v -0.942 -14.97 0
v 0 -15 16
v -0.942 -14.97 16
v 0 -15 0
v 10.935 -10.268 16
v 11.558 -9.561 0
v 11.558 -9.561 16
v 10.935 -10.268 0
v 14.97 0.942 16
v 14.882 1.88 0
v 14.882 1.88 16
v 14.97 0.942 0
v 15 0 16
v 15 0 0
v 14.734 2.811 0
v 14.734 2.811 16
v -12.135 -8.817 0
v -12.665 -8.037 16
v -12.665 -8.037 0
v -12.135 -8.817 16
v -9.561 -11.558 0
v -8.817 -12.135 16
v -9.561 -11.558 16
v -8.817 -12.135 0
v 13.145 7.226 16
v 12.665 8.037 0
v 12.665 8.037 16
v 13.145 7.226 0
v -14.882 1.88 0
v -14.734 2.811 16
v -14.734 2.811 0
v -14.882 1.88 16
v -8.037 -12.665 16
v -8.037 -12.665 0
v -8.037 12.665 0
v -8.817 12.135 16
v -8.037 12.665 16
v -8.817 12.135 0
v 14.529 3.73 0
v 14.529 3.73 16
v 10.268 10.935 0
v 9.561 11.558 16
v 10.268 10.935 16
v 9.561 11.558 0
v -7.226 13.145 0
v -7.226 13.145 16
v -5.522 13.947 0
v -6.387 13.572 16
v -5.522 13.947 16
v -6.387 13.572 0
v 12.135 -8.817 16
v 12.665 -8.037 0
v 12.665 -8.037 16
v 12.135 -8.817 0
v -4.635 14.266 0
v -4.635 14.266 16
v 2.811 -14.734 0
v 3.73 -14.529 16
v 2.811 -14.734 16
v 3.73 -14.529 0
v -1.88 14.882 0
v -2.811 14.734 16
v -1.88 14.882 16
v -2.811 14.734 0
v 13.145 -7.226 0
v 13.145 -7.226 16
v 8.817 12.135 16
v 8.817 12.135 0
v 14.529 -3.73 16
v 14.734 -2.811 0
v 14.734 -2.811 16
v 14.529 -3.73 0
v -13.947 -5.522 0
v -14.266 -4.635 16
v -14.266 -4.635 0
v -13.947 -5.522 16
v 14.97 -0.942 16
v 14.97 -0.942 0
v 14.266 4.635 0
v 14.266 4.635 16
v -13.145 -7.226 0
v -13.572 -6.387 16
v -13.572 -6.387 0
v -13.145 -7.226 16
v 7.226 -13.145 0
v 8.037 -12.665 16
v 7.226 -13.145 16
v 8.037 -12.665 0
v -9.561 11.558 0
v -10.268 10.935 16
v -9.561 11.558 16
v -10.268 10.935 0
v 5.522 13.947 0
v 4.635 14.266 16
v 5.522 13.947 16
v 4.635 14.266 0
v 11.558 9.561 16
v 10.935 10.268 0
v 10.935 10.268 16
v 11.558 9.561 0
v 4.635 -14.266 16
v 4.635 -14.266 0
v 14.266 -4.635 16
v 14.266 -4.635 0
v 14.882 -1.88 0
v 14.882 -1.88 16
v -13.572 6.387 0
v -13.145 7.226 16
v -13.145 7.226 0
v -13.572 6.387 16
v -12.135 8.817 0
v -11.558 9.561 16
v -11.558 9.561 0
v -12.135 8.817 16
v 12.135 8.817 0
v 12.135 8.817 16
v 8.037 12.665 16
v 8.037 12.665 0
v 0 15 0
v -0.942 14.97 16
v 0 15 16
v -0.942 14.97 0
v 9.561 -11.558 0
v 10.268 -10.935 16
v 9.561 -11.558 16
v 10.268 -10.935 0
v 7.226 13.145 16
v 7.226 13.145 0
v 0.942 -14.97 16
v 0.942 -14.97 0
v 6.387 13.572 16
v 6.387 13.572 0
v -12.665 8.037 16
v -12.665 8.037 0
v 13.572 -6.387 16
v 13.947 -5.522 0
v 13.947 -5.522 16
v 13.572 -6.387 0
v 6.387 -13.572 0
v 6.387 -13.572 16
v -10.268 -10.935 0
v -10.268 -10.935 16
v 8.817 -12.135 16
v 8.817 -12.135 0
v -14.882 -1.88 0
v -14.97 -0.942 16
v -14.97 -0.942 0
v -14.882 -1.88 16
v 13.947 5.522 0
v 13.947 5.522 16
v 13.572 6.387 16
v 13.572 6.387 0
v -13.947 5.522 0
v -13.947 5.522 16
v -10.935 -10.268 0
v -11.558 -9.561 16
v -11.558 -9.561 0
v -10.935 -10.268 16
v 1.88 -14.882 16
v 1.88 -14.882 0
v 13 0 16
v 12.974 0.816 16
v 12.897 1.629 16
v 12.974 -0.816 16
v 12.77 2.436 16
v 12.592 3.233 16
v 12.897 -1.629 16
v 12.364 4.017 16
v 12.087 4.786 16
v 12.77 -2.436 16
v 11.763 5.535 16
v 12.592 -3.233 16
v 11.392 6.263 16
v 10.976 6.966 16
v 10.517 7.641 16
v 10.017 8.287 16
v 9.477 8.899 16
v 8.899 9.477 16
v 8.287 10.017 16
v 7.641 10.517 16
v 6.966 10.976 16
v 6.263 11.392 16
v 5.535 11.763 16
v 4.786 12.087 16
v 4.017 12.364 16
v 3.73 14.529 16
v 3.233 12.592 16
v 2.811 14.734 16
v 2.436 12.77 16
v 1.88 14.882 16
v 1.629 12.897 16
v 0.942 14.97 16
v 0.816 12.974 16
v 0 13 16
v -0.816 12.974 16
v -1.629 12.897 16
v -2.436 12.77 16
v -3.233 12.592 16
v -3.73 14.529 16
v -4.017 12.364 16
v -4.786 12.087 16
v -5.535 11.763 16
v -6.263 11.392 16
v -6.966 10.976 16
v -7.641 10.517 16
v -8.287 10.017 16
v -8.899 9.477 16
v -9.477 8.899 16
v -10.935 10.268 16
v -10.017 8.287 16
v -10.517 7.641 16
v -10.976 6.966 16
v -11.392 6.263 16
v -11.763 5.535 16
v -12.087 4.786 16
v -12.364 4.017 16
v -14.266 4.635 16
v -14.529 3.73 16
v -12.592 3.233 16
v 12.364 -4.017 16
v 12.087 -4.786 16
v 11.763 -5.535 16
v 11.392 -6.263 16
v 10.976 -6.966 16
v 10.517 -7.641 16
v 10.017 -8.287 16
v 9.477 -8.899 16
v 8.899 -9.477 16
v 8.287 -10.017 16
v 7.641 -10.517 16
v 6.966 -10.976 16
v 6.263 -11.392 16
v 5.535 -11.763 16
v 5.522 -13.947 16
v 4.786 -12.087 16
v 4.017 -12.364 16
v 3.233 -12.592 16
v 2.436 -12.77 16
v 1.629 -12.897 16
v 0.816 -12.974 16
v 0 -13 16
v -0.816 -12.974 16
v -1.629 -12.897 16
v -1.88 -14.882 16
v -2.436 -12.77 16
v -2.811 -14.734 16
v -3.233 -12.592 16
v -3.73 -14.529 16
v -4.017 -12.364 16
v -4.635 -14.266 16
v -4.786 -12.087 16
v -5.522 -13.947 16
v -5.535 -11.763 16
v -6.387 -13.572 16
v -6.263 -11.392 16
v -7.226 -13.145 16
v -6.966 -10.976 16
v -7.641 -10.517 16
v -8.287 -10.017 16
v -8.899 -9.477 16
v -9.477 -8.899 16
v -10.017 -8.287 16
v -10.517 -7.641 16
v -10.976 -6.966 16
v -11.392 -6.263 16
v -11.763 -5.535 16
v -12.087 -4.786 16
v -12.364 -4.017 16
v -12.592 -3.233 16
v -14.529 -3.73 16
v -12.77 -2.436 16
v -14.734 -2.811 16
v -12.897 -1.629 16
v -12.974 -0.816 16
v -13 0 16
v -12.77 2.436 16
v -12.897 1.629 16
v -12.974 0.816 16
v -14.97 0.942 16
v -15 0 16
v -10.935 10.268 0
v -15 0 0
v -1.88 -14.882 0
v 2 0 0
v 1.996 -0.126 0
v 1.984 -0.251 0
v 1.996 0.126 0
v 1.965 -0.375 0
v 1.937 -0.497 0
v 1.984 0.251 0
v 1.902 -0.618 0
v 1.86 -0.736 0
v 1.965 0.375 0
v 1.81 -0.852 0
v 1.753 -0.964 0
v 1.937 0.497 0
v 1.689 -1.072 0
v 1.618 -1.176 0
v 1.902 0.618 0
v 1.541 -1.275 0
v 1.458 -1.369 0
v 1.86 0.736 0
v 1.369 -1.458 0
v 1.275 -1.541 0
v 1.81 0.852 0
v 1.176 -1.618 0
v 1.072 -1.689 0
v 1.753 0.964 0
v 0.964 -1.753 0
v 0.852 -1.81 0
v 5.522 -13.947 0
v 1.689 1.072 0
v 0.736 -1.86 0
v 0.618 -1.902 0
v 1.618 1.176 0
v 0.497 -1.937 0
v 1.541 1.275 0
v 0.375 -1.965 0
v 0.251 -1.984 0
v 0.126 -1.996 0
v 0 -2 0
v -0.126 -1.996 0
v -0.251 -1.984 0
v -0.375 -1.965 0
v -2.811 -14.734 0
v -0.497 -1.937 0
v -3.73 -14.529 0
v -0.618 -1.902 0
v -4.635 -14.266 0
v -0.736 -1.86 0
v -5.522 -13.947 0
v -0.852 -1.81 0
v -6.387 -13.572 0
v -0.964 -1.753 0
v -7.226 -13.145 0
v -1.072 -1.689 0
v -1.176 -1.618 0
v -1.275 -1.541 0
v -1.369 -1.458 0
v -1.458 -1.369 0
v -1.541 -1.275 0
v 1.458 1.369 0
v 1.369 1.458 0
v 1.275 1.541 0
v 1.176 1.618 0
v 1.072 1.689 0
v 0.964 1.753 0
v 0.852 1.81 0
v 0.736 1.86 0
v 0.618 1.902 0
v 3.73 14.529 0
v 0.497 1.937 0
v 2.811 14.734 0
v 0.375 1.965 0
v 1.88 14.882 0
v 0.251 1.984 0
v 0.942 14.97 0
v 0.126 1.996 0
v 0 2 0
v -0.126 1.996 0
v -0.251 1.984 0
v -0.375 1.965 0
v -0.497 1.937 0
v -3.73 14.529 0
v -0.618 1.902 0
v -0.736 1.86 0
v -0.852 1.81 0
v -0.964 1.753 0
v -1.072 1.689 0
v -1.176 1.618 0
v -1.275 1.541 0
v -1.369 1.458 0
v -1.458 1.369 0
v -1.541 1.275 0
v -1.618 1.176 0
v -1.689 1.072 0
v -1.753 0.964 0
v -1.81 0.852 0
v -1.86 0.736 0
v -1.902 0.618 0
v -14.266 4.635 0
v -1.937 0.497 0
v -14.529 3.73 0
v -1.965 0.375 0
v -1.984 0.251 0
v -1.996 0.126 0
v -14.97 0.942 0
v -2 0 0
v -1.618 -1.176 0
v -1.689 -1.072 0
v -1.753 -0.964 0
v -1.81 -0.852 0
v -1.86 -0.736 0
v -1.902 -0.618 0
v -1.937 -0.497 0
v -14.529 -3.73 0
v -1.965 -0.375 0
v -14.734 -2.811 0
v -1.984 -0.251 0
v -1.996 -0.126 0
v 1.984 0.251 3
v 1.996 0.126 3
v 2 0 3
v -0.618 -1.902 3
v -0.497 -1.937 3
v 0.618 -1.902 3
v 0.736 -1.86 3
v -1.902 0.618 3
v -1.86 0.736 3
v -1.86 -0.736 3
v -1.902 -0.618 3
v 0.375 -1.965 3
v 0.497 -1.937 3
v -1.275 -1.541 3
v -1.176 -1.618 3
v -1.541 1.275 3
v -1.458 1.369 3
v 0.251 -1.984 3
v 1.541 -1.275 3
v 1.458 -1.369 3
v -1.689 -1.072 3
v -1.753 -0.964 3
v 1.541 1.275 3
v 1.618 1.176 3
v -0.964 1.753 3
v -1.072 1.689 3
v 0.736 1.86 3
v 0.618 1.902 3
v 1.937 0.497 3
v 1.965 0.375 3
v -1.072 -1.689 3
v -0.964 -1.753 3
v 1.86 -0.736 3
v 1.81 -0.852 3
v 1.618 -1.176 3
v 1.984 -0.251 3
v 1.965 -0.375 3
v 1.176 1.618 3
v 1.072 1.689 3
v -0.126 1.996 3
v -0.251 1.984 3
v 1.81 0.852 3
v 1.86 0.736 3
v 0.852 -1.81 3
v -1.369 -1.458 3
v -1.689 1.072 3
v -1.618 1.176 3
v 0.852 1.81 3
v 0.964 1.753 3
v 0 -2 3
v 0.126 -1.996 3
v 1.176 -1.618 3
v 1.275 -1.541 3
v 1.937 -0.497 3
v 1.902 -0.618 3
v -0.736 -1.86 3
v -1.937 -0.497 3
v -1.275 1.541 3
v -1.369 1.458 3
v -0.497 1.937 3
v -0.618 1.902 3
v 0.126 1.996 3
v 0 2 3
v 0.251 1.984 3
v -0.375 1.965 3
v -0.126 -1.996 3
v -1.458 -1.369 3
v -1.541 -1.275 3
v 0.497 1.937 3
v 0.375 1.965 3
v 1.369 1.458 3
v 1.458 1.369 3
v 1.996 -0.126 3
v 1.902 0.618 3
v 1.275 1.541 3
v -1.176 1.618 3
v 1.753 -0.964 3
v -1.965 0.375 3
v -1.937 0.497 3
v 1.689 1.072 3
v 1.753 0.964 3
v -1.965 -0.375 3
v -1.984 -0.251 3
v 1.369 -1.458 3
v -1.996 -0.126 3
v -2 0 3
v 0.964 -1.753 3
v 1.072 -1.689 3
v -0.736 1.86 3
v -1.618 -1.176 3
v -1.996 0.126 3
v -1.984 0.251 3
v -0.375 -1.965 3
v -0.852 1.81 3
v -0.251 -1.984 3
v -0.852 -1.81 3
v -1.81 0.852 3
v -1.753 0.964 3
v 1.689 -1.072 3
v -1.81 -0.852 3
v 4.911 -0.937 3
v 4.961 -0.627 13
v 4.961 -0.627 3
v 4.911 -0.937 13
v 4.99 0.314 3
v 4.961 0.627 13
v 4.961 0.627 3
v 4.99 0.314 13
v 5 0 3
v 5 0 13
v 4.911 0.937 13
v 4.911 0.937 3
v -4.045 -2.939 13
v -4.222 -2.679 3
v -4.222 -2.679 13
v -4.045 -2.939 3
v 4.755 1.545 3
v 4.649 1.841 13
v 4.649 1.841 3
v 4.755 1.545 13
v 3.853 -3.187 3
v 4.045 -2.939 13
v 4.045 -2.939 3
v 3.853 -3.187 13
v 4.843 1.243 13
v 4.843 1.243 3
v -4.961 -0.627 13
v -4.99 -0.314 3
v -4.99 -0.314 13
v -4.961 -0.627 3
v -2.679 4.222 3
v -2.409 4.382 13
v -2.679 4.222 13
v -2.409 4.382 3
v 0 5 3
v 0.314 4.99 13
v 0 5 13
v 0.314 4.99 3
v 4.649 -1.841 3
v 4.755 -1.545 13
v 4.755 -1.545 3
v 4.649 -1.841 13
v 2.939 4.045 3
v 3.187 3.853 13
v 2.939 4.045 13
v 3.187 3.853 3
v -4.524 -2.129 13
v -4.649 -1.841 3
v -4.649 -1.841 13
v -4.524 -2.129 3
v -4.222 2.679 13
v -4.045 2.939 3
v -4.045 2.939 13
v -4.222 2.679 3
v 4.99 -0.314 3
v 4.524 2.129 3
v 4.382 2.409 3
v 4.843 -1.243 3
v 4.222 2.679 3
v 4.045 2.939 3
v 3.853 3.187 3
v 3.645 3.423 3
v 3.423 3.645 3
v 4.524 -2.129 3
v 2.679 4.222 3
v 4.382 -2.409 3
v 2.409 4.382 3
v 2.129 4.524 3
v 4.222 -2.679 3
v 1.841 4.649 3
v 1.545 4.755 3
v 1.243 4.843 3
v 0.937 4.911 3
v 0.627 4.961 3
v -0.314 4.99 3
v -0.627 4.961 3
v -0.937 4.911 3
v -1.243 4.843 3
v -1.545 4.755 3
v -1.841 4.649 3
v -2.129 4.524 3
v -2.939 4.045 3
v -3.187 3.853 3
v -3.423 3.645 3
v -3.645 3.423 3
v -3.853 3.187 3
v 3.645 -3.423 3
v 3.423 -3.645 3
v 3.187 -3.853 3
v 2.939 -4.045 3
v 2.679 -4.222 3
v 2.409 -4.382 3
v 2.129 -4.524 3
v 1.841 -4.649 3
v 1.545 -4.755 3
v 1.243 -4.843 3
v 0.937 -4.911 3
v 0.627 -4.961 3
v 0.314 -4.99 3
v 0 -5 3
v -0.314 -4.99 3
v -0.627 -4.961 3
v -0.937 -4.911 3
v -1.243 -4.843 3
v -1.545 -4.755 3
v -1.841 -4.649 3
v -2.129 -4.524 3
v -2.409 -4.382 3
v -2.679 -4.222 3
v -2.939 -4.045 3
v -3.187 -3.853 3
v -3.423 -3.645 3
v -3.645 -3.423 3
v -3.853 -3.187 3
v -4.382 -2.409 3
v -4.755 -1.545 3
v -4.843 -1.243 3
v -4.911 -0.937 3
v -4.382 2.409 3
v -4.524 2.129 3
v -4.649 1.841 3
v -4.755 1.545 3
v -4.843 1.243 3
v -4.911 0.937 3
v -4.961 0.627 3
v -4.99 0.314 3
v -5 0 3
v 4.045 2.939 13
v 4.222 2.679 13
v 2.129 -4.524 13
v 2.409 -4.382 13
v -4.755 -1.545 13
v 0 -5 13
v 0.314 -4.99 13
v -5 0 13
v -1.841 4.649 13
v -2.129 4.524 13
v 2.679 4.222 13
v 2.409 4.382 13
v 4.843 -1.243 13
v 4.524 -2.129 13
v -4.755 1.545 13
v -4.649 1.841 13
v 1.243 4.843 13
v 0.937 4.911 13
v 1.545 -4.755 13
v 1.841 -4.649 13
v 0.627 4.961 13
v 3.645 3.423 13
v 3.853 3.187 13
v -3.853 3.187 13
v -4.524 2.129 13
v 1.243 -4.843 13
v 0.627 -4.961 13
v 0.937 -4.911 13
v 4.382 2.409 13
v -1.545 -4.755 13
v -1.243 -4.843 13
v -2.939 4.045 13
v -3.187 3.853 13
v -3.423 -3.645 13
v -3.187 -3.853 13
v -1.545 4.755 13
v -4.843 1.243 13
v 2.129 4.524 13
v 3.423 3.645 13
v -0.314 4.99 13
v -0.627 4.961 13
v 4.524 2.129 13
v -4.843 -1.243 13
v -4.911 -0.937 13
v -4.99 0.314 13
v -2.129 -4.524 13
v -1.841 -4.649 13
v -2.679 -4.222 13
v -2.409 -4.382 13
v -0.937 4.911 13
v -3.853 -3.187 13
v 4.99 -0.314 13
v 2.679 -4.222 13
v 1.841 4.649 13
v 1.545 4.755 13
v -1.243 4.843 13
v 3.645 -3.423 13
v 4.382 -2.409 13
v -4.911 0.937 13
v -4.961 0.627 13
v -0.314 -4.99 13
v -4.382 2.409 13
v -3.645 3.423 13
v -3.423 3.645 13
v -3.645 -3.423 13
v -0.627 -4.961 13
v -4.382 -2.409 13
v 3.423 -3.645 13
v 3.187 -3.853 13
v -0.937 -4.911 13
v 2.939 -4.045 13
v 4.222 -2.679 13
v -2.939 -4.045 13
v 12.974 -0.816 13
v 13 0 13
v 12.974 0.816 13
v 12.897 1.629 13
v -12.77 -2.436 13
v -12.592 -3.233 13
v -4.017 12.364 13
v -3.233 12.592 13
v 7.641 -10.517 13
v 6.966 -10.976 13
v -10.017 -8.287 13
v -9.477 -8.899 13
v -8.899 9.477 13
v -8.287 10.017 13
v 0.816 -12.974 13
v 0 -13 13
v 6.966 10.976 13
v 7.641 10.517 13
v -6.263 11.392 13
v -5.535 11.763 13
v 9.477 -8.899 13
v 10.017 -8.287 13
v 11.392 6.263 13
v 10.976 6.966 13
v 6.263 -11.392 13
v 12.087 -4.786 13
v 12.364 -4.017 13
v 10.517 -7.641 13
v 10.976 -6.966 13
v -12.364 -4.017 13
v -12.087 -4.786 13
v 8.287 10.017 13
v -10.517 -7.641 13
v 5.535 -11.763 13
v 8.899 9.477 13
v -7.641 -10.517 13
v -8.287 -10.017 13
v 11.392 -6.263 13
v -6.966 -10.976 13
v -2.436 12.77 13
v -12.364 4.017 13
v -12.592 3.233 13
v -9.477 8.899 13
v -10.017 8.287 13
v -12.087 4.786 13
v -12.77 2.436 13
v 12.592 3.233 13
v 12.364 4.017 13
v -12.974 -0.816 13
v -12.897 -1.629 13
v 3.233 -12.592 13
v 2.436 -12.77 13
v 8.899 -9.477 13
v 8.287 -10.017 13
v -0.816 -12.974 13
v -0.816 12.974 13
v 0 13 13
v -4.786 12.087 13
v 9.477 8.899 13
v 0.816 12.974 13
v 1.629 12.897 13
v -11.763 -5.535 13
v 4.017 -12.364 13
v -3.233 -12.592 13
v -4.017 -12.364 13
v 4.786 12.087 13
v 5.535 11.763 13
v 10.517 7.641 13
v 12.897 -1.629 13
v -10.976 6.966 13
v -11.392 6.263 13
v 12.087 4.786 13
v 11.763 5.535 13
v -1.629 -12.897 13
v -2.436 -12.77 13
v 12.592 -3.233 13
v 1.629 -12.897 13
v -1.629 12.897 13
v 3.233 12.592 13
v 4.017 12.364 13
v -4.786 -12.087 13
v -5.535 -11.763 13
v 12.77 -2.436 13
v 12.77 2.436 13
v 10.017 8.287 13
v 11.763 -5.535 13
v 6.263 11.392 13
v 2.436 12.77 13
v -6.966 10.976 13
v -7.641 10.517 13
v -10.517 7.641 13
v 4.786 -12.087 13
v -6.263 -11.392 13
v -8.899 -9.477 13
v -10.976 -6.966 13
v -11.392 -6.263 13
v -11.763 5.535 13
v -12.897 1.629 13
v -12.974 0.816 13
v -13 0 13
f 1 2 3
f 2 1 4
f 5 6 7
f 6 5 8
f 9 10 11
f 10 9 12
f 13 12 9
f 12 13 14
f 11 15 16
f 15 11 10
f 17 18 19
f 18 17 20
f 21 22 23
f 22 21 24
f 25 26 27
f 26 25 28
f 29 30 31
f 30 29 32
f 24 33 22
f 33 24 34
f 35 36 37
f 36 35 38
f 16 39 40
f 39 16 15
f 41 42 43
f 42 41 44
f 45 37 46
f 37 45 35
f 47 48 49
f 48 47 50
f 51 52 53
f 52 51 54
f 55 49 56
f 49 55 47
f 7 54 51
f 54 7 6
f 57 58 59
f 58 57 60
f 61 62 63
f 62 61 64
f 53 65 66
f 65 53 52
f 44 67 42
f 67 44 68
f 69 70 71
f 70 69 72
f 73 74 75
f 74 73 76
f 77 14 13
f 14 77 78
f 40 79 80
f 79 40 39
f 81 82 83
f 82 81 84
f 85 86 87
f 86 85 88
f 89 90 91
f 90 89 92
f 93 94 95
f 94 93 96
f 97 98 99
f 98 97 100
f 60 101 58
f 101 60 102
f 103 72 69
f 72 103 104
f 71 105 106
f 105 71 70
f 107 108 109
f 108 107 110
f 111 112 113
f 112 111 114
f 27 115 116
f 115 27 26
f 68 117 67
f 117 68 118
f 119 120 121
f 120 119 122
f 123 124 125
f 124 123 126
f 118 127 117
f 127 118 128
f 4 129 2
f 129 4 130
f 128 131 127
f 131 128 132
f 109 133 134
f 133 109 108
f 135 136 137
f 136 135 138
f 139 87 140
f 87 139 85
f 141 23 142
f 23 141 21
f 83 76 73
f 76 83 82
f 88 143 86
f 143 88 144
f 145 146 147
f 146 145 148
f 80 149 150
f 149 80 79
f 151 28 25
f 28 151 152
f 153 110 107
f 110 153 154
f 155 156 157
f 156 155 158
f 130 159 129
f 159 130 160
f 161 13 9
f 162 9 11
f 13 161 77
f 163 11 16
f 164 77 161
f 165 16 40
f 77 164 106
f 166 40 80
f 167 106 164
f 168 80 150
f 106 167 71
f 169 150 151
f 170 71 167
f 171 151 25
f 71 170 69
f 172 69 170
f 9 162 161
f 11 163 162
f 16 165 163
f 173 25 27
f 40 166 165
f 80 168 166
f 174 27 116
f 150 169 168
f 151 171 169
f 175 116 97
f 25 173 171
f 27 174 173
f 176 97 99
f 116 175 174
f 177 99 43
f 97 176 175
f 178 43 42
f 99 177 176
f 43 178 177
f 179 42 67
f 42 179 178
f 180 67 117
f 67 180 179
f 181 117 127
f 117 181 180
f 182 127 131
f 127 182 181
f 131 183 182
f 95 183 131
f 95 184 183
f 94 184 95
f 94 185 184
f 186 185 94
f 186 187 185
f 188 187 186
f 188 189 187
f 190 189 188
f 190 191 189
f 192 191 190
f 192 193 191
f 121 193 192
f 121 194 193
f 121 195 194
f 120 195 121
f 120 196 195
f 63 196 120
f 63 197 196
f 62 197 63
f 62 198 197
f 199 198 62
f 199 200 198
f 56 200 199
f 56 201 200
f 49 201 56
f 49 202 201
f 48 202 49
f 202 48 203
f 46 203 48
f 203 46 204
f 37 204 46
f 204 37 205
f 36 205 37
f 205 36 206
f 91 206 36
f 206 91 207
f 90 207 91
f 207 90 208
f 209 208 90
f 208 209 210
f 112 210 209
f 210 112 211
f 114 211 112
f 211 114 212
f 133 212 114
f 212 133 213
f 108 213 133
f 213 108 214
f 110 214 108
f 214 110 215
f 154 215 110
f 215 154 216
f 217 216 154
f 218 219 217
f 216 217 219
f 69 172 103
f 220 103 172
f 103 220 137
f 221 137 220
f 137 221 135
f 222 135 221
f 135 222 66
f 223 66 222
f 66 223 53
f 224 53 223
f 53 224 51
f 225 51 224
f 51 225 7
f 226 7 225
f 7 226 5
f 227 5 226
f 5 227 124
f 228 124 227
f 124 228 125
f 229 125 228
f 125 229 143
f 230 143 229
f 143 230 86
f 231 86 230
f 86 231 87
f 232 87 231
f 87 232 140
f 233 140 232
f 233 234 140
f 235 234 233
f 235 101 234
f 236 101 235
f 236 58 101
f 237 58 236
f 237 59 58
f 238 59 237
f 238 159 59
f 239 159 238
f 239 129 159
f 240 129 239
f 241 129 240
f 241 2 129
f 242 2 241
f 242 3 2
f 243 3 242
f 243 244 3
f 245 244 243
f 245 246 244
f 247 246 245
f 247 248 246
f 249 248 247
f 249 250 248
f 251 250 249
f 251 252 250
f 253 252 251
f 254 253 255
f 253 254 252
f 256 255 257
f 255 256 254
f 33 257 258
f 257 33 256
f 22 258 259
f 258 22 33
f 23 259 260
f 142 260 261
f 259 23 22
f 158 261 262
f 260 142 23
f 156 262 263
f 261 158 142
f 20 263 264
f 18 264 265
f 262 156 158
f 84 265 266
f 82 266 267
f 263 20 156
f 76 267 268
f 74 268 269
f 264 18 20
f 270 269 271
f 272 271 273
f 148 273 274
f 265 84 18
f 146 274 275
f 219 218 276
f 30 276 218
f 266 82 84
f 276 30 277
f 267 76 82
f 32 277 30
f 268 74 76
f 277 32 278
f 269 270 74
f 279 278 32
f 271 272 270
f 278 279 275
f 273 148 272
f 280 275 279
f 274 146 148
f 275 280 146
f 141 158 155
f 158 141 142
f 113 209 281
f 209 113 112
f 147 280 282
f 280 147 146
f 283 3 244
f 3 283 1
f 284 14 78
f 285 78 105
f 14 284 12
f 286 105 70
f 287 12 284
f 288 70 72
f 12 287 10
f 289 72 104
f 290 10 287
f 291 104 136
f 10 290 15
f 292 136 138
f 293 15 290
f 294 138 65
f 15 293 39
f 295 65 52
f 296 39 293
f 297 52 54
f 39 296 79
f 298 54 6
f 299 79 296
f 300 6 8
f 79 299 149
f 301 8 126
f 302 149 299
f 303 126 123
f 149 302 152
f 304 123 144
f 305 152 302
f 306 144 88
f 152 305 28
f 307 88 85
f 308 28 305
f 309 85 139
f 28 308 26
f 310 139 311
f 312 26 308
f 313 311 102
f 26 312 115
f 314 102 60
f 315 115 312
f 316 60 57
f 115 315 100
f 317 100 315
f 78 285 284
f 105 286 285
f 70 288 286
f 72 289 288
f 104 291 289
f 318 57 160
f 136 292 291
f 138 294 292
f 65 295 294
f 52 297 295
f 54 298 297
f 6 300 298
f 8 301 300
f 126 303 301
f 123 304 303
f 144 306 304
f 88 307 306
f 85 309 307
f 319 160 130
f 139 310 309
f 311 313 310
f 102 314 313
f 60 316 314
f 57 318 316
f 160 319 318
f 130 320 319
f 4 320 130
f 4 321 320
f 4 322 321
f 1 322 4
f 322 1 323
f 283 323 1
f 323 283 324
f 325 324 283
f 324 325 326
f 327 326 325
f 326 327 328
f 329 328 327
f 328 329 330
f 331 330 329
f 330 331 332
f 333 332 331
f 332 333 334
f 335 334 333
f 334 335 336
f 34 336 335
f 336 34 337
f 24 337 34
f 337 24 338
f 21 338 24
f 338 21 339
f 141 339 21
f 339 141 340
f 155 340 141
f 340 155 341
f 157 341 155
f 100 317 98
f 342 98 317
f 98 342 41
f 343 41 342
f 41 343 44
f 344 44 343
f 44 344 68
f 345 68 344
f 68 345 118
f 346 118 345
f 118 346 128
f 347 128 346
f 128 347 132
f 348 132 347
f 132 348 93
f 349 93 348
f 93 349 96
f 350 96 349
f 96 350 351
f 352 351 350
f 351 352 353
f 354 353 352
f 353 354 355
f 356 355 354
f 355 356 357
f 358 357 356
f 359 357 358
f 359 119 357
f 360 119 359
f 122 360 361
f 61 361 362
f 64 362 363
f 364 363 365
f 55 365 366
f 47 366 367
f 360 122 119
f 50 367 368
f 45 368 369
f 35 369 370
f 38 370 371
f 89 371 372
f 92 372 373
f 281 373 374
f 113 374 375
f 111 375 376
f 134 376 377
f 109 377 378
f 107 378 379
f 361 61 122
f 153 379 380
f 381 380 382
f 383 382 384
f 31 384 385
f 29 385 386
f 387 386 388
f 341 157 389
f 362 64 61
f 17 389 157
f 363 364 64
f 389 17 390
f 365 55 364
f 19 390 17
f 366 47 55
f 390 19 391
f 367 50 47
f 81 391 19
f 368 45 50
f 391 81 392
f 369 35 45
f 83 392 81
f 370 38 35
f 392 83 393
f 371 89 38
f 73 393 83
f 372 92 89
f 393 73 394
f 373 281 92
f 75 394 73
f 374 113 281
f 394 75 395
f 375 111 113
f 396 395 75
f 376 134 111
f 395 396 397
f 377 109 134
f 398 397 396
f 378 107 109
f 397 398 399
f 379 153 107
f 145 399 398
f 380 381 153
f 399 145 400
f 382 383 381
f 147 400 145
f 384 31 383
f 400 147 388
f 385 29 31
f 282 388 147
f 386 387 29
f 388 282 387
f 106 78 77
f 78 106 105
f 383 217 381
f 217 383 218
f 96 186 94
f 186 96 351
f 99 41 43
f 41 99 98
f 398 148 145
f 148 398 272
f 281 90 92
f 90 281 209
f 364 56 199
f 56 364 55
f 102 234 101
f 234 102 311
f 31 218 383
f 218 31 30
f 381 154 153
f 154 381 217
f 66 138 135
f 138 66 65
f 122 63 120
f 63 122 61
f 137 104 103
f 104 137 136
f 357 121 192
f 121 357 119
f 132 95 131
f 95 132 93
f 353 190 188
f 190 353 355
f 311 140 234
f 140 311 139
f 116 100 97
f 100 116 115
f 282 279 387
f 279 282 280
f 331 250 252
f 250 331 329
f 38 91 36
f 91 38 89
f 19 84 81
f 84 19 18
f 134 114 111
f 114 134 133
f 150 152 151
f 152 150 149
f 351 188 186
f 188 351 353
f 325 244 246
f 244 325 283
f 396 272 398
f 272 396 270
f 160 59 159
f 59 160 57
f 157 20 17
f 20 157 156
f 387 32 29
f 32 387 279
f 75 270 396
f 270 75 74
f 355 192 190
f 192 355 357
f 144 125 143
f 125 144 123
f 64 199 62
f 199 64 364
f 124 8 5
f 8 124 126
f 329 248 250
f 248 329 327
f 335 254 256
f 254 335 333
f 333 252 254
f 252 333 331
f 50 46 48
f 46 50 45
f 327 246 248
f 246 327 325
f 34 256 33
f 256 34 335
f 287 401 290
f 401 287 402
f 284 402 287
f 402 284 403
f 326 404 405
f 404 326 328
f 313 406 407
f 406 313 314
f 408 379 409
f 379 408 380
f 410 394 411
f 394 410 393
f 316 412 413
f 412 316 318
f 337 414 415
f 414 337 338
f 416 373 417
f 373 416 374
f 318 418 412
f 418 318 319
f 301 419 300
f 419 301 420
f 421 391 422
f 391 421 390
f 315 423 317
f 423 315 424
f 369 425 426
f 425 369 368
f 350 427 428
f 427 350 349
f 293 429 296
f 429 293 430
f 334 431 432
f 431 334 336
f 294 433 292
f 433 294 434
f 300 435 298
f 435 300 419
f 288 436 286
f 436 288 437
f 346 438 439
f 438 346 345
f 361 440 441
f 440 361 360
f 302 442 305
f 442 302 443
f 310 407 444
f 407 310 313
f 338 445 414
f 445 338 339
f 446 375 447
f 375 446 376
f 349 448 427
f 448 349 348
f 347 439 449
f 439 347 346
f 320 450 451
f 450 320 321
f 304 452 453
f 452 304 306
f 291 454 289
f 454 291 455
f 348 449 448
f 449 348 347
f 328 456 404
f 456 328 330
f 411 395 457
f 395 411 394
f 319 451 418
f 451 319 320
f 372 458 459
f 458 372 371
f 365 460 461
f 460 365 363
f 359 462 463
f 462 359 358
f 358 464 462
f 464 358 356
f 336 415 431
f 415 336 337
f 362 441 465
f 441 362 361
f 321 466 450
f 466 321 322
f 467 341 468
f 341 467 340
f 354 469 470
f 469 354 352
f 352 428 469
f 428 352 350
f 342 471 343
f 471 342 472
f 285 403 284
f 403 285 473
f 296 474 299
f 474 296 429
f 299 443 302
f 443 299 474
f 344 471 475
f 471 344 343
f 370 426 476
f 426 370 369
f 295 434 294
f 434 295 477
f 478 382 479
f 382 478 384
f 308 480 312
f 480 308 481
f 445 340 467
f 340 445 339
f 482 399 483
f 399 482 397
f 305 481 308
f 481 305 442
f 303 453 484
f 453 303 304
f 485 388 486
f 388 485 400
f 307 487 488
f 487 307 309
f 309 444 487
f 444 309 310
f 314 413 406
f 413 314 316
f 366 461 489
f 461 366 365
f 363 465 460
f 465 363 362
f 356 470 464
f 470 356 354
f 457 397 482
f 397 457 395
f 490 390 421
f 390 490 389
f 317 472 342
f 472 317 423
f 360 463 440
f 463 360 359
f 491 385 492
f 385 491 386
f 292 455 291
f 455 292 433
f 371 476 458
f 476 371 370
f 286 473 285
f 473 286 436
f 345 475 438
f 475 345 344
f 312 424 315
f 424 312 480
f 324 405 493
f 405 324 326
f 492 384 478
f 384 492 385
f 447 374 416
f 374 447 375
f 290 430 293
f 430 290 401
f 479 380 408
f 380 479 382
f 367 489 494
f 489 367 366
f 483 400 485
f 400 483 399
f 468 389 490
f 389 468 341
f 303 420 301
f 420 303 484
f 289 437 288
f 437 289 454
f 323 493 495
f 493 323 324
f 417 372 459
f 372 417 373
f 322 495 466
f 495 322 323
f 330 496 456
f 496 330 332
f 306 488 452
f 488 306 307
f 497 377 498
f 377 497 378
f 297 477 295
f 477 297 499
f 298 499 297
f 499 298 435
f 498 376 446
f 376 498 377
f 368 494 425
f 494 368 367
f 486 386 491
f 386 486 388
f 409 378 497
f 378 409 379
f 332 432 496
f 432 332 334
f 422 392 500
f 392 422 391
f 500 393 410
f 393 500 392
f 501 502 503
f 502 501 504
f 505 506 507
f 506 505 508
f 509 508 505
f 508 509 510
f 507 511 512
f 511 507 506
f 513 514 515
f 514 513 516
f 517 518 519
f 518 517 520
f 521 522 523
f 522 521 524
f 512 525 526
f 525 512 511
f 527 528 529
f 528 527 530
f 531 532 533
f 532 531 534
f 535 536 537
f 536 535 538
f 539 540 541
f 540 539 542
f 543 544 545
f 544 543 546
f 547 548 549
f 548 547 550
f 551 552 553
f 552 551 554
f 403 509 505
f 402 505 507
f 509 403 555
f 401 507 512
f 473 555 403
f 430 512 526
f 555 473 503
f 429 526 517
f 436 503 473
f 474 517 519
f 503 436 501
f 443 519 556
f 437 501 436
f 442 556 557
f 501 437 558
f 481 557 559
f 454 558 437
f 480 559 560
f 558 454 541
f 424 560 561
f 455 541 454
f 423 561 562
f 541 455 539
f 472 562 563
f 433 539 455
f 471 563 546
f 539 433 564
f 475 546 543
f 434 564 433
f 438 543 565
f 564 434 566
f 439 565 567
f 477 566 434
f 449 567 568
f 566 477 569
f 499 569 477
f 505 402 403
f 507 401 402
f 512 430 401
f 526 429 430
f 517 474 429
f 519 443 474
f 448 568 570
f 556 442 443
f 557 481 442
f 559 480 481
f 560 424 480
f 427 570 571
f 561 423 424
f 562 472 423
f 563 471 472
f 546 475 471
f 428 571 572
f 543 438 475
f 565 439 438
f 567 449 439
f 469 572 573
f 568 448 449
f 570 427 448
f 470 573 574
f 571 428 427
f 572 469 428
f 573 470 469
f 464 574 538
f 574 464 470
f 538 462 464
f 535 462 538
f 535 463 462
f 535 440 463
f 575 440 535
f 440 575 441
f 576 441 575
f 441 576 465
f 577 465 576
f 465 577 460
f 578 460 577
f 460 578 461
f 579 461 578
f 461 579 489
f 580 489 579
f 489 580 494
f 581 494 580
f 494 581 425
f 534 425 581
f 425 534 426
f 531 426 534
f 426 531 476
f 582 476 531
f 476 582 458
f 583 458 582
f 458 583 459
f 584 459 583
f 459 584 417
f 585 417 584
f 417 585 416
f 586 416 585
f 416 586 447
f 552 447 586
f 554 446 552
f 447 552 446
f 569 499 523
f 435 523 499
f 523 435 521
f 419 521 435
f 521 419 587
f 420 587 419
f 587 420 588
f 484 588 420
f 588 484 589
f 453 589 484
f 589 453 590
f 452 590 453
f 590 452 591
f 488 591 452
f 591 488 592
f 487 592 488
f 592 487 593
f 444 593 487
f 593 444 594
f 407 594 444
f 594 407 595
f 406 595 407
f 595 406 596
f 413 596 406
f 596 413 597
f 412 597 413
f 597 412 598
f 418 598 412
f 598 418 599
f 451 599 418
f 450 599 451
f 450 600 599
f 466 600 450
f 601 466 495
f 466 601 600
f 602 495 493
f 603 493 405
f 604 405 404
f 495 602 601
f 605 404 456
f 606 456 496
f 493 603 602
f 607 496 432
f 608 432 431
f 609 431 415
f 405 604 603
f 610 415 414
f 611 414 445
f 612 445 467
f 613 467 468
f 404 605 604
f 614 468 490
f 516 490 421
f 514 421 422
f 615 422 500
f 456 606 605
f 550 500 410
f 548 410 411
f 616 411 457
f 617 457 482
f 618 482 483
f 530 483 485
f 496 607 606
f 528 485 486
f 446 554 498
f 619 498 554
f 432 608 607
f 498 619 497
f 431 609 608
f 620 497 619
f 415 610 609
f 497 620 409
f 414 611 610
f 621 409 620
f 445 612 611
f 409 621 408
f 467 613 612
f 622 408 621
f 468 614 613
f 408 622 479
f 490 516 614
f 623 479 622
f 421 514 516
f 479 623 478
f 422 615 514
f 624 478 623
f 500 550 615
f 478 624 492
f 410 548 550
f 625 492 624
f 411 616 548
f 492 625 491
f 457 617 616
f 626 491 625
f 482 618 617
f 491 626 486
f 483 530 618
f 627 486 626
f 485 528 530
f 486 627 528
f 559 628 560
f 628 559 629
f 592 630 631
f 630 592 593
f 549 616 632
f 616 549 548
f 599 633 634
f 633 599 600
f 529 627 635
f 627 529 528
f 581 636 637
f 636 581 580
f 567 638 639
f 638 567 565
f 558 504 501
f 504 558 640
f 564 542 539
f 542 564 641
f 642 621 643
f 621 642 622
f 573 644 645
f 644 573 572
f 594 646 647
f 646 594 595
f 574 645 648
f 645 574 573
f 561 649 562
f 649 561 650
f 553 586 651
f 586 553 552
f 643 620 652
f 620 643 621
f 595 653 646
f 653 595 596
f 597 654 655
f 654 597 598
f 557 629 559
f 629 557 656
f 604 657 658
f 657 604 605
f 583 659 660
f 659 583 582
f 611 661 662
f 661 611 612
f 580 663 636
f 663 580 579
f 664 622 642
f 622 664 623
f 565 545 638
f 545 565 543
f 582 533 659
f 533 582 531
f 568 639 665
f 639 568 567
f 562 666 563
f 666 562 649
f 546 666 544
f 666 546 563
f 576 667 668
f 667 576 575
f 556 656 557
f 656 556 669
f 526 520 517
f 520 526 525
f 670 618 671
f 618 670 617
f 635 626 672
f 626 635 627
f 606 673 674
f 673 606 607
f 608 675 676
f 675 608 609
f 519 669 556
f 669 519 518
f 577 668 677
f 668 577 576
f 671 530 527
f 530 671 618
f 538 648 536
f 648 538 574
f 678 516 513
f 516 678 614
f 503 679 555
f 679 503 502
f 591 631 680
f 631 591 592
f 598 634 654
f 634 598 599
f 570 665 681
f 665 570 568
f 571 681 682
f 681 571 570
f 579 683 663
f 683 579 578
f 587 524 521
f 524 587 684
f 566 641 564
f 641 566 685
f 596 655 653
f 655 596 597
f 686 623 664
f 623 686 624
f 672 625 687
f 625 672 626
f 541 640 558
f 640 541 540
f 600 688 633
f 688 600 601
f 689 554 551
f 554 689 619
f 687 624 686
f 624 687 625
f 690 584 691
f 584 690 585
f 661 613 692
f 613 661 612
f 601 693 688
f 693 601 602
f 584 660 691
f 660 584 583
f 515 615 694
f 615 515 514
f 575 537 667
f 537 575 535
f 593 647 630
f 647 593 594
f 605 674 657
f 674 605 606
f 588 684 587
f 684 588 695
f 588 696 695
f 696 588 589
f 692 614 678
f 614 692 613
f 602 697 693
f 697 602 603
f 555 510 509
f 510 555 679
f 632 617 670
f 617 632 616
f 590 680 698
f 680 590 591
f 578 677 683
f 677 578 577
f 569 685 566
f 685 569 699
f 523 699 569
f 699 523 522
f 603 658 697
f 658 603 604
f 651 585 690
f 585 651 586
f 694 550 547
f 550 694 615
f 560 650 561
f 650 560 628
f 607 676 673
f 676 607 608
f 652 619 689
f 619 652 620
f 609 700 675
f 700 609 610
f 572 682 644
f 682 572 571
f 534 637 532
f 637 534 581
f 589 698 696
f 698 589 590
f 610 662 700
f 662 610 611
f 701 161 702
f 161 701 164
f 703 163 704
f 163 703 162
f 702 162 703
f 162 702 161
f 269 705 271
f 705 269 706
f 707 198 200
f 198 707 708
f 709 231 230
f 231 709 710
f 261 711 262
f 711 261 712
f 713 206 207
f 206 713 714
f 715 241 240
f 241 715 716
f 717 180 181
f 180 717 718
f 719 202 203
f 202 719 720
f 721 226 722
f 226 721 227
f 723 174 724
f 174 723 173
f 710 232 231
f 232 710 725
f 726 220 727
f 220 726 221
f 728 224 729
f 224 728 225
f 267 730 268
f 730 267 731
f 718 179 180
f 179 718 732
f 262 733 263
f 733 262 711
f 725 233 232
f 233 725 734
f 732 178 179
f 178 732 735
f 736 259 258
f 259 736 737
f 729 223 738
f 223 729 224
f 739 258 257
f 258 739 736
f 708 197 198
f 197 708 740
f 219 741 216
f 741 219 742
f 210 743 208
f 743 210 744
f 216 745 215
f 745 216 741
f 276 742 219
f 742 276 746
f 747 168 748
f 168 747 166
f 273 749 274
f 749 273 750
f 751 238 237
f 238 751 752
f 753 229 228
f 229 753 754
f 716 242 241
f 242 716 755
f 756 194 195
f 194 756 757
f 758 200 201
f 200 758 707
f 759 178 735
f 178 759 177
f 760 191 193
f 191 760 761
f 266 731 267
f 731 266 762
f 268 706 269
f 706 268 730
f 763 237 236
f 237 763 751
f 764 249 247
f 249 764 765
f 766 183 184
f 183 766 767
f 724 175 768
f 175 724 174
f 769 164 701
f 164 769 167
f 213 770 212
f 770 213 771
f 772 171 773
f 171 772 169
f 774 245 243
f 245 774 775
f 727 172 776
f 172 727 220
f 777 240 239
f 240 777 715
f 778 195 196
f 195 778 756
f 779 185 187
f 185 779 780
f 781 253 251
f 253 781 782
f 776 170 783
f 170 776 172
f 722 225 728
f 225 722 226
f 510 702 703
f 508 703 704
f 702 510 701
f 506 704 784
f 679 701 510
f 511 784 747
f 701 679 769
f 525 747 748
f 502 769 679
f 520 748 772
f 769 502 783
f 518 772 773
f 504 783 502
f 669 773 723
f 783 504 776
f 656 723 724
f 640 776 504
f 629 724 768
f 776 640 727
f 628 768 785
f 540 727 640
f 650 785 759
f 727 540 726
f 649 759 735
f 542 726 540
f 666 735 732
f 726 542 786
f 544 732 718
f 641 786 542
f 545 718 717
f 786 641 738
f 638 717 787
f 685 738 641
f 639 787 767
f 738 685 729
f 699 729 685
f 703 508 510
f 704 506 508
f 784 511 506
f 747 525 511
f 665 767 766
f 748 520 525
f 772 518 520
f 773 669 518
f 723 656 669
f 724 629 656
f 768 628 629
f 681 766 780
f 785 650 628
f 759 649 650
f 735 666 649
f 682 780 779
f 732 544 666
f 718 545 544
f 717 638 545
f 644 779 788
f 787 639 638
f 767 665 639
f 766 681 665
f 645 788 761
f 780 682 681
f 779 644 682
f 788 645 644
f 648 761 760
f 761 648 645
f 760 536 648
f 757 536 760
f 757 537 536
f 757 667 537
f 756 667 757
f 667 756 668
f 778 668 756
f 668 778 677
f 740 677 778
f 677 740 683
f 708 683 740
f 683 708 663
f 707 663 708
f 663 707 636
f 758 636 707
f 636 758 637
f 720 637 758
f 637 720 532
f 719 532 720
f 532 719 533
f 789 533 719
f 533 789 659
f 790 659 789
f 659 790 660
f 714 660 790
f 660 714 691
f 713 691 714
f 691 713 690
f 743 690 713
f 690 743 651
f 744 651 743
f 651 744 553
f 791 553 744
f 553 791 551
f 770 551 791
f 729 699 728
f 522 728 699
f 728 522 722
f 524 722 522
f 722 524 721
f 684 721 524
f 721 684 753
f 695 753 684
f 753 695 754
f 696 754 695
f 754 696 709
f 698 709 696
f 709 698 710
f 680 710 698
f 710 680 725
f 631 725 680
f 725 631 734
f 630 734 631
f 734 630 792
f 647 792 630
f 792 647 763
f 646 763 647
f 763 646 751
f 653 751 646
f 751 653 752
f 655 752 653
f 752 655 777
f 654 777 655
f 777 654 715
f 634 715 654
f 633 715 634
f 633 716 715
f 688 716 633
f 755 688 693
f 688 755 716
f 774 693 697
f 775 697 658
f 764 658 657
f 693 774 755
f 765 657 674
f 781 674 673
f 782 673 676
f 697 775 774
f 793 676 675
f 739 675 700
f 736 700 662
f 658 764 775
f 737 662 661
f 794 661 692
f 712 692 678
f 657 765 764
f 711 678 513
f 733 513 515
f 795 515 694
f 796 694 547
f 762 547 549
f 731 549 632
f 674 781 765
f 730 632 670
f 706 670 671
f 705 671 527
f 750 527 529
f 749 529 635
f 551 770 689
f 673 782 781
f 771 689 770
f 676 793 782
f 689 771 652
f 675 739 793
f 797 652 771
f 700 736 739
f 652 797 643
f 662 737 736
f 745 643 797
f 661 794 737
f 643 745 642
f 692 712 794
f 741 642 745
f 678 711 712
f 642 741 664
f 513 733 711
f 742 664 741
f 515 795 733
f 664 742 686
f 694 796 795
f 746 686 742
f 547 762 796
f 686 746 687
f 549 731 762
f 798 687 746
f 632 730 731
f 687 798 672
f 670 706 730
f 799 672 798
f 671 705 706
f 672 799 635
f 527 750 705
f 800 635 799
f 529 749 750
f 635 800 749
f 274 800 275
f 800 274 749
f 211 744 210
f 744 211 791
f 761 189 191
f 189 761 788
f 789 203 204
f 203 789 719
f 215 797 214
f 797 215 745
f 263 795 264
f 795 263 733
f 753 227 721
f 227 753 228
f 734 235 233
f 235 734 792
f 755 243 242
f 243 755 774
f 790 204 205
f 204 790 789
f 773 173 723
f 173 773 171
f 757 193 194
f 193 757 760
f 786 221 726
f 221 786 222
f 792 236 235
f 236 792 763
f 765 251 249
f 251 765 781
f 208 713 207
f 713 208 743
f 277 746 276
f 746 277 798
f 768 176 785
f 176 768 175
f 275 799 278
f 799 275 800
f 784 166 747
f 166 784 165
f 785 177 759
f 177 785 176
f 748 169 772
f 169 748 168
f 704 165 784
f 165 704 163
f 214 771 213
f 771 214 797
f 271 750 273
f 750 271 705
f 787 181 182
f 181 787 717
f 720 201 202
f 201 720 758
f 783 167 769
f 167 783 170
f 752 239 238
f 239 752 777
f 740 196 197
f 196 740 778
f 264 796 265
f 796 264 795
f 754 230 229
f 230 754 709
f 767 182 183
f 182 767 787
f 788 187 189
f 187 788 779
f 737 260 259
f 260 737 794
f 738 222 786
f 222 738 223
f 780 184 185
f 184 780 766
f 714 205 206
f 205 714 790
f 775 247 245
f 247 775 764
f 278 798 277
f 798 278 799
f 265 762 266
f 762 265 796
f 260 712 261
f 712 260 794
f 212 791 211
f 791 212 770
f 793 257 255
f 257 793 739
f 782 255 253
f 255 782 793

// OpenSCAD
difference(){
     cyl(15,16);
     cyl(2,offset=-1);
     cyl(5,offset=3);
     cyl(13,offset=13);
}

module cyl(r, h=100,offset=0) {
    translate([0,0,offset]) 
    cylinder(h,r,r, $fn=100);
} 
